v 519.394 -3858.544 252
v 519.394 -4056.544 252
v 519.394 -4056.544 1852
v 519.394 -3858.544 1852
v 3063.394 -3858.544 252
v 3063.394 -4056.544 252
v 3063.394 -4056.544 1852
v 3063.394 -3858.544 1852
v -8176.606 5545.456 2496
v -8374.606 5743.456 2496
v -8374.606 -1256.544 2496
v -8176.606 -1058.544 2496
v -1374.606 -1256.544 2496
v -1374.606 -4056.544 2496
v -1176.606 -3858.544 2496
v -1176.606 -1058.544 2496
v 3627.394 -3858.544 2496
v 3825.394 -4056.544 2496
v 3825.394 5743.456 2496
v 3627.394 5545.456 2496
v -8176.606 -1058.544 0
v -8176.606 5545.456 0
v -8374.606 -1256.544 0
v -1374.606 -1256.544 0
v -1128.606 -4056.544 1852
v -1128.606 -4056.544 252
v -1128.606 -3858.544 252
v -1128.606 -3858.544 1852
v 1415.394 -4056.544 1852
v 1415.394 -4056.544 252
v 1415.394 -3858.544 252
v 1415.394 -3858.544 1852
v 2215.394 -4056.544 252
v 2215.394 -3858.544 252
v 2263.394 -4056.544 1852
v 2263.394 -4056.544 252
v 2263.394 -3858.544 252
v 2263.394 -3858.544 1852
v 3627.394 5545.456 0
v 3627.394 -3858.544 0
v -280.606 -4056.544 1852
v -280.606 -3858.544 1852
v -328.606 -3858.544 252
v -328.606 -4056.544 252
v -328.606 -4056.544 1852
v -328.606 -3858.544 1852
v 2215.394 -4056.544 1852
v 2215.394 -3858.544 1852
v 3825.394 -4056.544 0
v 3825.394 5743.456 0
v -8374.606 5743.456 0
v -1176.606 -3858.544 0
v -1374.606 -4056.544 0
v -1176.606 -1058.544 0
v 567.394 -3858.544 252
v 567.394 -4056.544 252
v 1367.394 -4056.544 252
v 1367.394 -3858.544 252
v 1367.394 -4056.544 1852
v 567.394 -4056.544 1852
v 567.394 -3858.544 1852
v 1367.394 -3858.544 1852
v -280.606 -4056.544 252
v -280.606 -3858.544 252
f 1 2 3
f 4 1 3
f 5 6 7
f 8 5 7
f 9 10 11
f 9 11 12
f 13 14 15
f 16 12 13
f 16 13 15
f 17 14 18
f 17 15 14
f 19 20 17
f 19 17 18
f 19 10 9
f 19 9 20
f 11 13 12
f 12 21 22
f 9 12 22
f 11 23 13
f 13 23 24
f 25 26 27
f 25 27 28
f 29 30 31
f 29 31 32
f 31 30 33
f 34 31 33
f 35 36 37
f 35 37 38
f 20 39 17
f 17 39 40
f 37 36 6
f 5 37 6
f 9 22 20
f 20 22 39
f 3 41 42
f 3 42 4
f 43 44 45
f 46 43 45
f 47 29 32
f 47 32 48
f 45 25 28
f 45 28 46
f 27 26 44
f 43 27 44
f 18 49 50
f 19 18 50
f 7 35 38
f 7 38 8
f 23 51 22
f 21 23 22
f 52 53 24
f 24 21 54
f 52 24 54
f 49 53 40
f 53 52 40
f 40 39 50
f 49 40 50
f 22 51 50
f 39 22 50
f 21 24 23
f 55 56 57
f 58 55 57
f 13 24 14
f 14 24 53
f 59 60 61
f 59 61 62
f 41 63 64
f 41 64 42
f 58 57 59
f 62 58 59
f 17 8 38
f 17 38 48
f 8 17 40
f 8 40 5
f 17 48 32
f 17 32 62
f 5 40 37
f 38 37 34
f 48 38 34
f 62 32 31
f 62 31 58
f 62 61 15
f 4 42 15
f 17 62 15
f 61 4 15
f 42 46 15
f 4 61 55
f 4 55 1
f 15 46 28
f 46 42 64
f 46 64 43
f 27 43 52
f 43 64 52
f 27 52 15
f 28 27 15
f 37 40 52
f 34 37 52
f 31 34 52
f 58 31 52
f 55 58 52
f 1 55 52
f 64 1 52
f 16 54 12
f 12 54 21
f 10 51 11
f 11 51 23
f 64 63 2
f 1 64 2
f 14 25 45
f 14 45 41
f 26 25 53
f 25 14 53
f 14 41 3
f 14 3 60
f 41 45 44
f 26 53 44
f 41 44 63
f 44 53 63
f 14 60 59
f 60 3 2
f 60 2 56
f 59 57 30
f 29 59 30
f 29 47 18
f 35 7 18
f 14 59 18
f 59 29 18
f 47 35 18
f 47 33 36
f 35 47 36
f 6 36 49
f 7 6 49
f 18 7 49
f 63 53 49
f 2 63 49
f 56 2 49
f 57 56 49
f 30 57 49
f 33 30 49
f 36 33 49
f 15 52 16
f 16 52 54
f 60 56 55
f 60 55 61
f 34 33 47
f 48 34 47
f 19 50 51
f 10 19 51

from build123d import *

# Parameters (mm, degrees)
F1_DEPTH = 2496
F2_W     = 800
F2_H     = 1600
F3_DEPTH = 200


with BuildPart() as f1:
    # F0 (on Top) → F1 (new body)
    with BuildSketch(Plane.XY):
        Polygon((-1374.605918, -1256.544261), (-1374.605918, -4056.544261), (3825.394082, -4056.544261), (3825.394082, 5743.455739), (-8374.605918, 5743.455739), (-8374.605918, -1256.544261), align=None)
        Polygon((-1176.605918, -1058.544261), (-8176.605918, -1058.544261), (-8176.605918, 5545.455739), (3627.394082, 5545.455739), (3627.394082, -3858.544261), (-1176.605918, -3858.544261), align=None, mode=Mode.SUBTRACT)
    extrude(amount=F1_DEPTH)

    # F2 (on face) → F3 (cut)
    with BuildSketch(Plane.XZ.offset(4056.544261)):
        with Locations((119.394082, 1052)):
            Rectangle(F2_W, F2_H)
        with Locations((-728.605918, 1052)):
            Rectangle(F2_W, F2_H)
        with Locations((967.394082, 1052)):
            Rectangle(F2_W, F2_H)
        with Locations((1815.394082, 1052)):
            Rectangle(F2_W, F2_H)
        with Locations((2663.394082, 1052)):
            Rectangle(F2_W, F2_H)
    extrude(amount=-F3_DEPTH, mode=Mode.SUBTRACT)


solid = f1.part
